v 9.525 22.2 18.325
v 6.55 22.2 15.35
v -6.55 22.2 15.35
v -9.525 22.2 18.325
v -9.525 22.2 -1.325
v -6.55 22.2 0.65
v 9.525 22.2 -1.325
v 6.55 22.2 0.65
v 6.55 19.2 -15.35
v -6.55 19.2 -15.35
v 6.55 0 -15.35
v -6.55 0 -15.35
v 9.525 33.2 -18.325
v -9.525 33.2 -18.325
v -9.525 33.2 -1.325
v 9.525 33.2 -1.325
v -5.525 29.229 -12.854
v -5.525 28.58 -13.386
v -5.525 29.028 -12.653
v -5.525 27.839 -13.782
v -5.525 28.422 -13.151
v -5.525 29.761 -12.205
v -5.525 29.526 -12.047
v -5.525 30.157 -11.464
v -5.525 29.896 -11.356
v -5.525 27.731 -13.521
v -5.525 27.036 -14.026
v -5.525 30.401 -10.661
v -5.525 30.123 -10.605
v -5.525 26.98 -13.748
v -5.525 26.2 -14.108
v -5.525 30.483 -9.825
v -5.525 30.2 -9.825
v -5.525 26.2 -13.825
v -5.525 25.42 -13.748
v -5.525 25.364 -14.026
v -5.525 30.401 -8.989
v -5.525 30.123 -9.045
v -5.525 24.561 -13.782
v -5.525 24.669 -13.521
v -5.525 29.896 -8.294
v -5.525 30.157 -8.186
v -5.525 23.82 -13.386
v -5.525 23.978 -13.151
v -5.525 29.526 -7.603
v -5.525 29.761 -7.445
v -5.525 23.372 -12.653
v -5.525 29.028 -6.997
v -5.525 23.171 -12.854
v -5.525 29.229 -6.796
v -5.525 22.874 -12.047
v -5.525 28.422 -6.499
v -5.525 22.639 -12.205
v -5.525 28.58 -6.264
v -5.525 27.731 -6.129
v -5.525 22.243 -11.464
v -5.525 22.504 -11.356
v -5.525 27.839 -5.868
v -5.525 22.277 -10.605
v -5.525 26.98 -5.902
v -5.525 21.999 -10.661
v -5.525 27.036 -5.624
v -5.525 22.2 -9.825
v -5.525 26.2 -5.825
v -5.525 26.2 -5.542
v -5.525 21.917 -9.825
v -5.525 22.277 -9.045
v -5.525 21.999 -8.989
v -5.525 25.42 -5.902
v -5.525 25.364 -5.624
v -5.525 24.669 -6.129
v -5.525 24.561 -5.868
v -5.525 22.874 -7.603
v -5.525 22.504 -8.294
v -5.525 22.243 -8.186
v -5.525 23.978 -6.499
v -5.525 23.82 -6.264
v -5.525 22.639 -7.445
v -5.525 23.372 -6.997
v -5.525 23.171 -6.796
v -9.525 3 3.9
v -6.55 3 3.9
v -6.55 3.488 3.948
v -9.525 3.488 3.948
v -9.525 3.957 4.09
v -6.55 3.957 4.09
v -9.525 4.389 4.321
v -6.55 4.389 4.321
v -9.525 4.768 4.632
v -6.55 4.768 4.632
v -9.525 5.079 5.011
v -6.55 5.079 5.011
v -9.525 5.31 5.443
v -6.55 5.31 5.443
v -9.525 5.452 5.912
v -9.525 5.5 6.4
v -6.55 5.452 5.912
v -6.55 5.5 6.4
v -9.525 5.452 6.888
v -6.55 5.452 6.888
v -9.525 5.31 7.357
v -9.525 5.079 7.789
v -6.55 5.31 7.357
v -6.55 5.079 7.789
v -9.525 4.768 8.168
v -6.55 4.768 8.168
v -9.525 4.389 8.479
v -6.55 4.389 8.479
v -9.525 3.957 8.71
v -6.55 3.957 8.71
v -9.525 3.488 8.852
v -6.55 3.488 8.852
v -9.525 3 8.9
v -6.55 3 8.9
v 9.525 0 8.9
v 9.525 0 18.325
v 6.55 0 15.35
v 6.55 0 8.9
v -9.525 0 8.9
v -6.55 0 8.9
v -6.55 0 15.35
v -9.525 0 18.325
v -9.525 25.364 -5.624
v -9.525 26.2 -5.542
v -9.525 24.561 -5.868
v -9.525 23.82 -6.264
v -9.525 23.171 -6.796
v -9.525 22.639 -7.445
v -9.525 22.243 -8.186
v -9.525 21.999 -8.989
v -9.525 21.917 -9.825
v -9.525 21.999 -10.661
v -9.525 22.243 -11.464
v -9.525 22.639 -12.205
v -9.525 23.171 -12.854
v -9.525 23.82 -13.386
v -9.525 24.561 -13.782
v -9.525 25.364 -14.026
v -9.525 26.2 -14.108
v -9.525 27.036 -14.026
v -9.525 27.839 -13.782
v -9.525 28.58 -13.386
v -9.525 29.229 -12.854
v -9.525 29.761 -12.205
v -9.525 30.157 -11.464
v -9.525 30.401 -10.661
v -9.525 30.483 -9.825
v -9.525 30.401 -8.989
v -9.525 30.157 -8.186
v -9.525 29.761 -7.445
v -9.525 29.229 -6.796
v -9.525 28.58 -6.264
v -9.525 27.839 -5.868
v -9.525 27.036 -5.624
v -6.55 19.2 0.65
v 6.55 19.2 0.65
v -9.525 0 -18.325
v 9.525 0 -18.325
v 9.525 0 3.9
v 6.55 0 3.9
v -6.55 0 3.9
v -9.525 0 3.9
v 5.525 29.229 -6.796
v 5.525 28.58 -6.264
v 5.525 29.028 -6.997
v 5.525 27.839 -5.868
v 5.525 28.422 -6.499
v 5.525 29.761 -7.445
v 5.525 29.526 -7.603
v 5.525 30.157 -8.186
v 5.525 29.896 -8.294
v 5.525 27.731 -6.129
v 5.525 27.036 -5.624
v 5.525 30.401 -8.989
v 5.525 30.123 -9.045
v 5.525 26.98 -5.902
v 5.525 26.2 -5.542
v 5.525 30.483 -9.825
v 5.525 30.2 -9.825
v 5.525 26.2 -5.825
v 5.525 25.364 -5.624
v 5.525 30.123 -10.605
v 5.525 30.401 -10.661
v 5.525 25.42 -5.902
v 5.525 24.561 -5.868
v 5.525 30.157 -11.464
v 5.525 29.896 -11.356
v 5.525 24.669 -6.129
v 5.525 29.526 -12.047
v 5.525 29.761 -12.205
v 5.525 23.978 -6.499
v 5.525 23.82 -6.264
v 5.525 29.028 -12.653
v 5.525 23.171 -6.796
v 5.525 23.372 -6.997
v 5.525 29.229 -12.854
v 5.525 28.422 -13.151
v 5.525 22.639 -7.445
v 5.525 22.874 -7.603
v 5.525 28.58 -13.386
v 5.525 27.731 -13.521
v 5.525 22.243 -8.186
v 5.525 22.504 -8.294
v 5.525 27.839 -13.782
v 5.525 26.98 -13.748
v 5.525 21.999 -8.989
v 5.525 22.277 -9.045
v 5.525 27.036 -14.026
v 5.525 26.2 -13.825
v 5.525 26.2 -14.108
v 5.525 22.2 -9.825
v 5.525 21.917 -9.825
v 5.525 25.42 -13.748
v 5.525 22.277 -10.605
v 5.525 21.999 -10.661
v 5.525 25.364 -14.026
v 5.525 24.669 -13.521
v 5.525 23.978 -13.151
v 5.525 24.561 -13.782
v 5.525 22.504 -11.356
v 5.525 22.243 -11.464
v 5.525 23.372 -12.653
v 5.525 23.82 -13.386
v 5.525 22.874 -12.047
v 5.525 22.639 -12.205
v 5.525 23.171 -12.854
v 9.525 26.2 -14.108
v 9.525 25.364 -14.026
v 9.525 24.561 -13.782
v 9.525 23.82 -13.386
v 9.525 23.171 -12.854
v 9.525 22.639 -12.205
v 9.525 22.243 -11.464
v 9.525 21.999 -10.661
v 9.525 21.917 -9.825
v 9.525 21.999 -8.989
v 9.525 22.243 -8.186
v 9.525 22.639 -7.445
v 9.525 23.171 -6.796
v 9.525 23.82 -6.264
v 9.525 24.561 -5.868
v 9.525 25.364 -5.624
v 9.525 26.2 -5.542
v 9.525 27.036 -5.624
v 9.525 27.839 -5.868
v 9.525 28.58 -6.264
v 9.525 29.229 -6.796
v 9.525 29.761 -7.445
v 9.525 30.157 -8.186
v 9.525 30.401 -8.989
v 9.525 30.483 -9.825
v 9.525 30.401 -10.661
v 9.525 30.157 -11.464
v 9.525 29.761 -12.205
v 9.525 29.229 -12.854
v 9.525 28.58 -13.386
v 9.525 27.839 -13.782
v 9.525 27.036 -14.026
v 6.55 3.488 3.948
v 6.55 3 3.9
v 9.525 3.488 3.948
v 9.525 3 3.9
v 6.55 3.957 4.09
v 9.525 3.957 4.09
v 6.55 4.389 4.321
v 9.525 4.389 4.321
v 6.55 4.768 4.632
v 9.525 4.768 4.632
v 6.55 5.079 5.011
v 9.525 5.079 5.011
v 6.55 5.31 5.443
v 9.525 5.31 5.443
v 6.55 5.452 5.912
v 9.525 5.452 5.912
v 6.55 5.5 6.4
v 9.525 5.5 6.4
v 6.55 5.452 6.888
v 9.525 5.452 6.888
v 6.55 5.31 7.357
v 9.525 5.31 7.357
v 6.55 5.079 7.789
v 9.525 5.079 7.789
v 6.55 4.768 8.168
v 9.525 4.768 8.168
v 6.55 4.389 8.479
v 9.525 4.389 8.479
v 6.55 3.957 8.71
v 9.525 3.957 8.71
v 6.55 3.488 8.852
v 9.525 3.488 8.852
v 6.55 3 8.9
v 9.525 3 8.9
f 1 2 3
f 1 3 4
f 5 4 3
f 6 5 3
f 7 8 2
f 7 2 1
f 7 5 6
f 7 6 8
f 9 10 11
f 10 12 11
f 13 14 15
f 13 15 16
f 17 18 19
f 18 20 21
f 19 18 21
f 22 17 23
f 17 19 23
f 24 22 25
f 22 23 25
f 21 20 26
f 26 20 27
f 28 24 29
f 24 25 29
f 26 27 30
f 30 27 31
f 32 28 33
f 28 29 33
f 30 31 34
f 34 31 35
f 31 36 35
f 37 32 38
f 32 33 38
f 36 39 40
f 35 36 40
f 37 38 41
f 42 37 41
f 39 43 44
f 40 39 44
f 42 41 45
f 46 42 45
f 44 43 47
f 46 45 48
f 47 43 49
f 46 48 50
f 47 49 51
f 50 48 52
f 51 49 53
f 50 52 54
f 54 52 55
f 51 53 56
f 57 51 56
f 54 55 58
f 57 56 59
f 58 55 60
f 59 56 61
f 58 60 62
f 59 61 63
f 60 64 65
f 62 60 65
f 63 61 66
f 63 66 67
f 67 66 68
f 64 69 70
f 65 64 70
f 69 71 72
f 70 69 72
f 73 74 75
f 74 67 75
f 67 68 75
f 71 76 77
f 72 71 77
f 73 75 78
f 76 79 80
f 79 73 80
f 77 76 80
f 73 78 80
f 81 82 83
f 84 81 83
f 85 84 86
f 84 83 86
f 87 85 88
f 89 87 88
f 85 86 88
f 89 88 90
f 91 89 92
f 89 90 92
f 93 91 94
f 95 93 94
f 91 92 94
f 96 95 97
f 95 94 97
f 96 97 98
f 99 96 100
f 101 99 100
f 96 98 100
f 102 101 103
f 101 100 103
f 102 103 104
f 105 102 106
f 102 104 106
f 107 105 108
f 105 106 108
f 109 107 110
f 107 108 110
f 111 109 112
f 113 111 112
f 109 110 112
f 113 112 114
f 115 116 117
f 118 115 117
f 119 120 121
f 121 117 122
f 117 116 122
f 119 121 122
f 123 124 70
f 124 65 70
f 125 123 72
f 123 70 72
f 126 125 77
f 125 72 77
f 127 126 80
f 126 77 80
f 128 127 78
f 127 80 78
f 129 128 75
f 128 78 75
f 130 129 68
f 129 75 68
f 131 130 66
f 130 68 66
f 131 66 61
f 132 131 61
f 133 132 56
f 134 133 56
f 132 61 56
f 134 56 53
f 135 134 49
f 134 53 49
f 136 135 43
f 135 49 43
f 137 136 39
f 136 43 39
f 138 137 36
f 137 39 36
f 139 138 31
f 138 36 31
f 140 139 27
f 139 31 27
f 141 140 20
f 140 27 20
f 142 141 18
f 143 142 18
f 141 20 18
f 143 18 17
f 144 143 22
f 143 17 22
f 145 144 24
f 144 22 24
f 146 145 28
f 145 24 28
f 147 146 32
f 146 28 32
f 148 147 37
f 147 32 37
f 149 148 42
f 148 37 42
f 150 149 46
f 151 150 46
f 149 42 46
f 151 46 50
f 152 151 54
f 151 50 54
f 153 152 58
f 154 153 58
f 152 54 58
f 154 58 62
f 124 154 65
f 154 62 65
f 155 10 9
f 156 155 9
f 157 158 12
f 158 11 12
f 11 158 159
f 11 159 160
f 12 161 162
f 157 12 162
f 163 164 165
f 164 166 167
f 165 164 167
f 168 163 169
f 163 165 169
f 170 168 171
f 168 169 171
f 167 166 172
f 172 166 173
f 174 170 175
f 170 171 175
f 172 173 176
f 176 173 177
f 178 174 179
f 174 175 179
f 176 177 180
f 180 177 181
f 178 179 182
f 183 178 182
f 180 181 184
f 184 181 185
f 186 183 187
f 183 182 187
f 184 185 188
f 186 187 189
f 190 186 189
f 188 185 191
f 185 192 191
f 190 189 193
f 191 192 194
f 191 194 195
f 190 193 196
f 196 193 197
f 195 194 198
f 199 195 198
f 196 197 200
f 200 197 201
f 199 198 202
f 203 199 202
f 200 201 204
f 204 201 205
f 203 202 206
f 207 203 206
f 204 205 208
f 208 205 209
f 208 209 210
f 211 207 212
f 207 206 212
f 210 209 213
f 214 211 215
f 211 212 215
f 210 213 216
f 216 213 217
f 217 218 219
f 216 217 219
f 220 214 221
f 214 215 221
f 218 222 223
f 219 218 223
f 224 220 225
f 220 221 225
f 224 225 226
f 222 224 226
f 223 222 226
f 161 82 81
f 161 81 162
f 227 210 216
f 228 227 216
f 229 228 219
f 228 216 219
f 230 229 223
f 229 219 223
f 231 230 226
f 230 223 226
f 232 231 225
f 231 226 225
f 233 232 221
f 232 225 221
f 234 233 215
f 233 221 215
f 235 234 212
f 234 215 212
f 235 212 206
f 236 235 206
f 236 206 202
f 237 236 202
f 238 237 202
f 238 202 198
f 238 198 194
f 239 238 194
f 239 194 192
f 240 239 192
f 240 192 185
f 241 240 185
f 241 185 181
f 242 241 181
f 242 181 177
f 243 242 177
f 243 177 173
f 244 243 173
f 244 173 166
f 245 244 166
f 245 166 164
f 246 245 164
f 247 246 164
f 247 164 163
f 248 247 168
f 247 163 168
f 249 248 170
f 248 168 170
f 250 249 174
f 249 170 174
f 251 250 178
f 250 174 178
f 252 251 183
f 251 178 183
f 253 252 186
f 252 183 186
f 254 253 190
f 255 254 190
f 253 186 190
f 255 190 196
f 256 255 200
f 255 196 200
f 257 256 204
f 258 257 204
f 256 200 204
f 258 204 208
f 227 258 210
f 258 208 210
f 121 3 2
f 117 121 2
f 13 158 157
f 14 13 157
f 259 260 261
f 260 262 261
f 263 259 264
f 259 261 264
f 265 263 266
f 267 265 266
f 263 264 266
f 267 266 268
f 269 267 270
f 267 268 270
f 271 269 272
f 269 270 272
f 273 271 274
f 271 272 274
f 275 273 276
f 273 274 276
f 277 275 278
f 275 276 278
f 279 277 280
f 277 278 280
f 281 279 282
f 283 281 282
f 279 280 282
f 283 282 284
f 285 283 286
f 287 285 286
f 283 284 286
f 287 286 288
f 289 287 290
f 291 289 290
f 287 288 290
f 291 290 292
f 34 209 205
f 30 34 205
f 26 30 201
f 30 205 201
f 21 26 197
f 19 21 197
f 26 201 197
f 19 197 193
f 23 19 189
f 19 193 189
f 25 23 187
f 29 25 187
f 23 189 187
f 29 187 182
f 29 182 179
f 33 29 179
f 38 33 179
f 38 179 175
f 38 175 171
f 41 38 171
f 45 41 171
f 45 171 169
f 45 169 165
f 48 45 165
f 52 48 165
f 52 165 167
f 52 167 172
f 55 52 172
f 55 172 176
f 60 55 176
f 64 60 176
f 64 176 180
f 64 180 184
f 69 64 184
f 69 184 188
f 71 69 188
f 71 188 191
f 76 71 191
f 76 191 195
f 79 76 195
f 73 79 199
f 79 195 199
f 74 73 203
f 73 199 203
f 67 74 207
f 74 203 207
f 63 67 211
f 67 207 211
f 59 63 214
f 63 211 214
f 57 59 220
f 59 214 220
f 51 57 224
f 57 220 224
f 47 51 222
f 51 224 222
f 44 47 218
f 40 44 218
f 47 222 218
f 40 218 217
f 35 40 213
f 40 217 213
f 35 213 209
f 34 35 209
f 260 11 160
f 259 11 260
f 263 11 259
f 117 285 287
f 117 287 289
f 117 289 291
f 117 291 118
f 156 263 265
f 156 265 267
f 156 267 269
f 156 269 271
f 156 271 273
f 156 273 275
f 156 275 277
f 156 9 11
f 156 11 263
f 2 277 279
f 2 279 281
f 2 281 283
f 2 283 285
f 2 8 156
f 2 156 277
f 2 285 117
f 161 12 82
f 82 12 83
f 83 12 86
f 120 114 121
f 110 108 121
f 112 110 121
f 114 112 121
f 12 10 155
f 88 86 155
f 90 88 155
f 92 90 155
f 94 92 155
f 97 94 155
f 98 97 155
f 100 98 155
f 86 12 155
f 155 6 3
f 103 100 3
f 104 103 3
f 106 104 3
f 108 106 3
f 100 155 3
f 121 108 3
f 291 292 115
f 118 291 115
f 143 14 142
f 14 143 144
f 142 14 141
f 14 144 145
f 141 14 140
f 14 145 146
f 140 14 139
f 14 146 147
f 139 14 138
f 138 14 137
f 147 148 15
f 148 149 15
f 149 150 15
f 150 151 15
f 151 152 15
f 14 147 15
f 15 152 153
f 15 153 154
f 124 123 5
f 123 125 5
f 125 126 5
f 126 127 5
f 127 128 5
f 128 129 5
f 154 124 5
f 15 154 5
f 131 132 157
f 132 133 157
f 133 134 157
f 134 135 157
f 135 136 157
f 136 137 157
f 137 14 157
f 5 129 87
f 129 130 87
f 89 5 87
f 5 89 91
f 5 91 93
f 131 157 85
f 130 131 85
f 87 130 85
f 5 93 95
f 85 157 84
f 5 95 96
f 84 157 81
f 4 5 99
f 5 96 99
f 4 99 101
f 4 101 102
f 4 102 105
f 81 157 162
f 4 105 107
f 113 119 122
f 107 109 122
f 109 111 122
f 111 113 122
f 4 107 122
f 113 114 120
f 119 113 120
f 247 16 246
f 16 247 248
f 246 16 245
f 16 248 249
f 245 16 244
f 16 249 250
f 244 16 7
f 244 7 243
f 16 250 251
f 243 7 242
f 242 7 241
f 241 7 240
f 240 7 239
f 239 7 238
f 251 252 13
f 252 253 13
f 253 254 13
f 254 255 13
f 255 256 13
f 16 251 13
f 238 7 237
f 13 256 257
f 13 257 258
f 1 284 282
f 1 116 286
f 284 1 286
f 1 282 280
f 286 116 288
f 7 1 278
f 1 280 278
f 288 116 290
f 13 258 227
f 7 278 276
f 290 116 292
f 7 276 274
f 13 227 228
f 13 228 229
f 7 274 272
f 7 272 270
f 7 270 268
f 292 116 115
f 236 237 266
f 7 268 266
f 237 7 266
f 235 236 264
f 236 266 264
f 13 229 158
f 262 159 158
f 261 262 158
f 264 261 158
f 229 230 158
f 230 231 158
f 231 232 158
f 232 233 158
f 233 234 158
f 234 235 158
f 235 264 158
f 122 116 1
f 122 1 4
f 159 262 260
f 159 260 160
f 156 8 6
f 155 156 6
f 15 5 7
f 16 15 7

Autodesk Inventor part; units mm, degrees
ref_plane "YZ Plane" through (0, 0, 0) normal (1, 0, 0) x (0, 1, 0)
ref_plane "XZ Plane" through (0, 0, 0) normal (0, 1, 0) x (-1, 0, 0)
ref_plane "XY Plane" through (0, 0, 0) normal (0, 0, 1) x (1, 0, 0)
sketch "Sketch1" plane through (0, 0, 0) normal (0, 1, 0) x (-1, 0, 0)
  point P0 (0, 0)
sketch "Sketch2" plane through (0, 0, 0) normal (0, 1, 0) x (-1, 0, 0)
  line L0 (-6.55, 15.35) -> (6.55, 15.35)
  line L1 (6.55, 15.35) -> (6.55, -15.35)
  line L2 (6.55, -15.35) -> (-6.55, -15.35)
  line L3 (-6.55, -15.35) -> (-6.55, 15.35)
  line L4 (-6.55, 15.35) -> (6.55, -15.35) construction
  line L5 (6.55, 15.35) -> (-6.55, -15.35) construction
  line L6 (-9.525, 18.325) -> (9.525, 18.325)
  line L7 (9.525, 18.325) -> (9.525, -18.325)
  line L8 (9.525, -18.325) -> (-9.525, -18.325)
  line L9 (-9.525, -18.325) -> (-9.525, 18.325)
  line L10 (-9.525, 18.325) -> (9.525, -18.325) construction
  line L11 (9.525, 18.325) -> (-9.525, -18.325) construction
  point P0 (0, 0)
  dimension "d0" = 13.1
  dimension "d1" = 30.7
  dimension "d2" = 19.05
  dimension "d3" = 36.65
extrude "Extrusion1" add sketch "Sketch2" along normal blind 19.2
sketch "Sketch3" plane through (0, 19.2, 0) normal (0, 1, 0) x (1, 0, 0)
  line L0 (-9.525, -18.325) -> (9.525, -18.325)
  line L1 (9.525, -18.325) -> (9.525, 18.325)
  line L2 (9.525, 18.325) -> (-9.525, 18.325)
  line L3 (-9.525, 18.325) -> (-9.525, -18.325)
  point P0 (0, 0)
extrude "Extrusion2" add sketch "Sketch3" along normal blind 3
sketch "Sketch4" plane through (0, 22.2, 0) normal (0, 1, 0) x (1, 0, 0)
  line L0 (-6.55, -15.35) -> (-6.55, 15.35) construction
  line L1 (6.55, -15.35) -> (-6.55, -15.35) construction
  line L2 (-6.55, -15.35) -> (-6.55, 15.35) construction
  line L3 (-6.55, 15.35) -> (6.55, 15.35) construction
  line L4 (6.55, 15.35) -> (6.55, -15.35) construction
  line L5 (6.55, -15.35) -> (-6.55, 15.35) construction
  line L6 (-6.55, -15.35) -> (6.55, 15.35) construction
  line L7 (6.55, 15.35) -> (6.55, -15.35) projected
  line L8 (-6.55, -15.35) -> (6.55, -15.35)
  line L9 (6.55, -15.35) -> (6.55, -0.65)
  line L10 (6.55, -0.65) -> (-6.55, -0.65)
  line L11 (-6.55, -0.65) -> (-6.55, -15.35)
  point P0 (0, 0)
  point P1 (6.55, -15.35)
  dimension "d8" = 14.7
extrude "Extrusion3" cut sketch "Sketch4" against normal blind 5
sketch "Sketch6" plane through (9.525, 0, 18.325) normal (1, 0, 0) x (0, 0, -1)
  line L0 (0, 0) -> (36.65, 0) construction
  line L1 (0, 0) -> (11.925, 0) construction
  line L2 (11.925, 0) -> (11.925, 3) construction
  line L3 (11.925, 3) -> (0, 3) construction
  line L4 (0, 3) -> (0, 0) construction
  circle A0 centre (11.925, 3) radius 2.5
  line L5 (9.425, 3) -> (9.425, -0.2828)
  line L6 (14.425, 3) -> (14.425, 0)
  line L7 (9.425, 0) -> (14.425, 0)
  point P0 (18.325, 0)
  dimension "d16" = 11.925
  dimension "d17" = 3
  dimension "d18" = 5
extrude "Extrusion5" cut sketch "Sketch6" against normal through all
sketch "Sketch7" plane through (0, 22.2, 0) normal (0, 1, 0) x (1, 0, 0)
  line L0 (9.525, 18.325) -> (-9.525, 18.325) projected
  line L1 (-9.525, 18.325) -> (-9.525, -18.325) projected
  line L2 (9.525, 18.325) -> (-9.525, 18.325)
  line L3 (-9.525, 18.325) -> (-9.525, 1.325)
  line L4 (-9.525, 1.325) -> (9.525, 1.325)
  line L5 (9.525, 1.325) -> (9.525, 18.325)
  point P0 (0, 0)
  dimension "d21" = 17
extrude "Extrusion6" add sketch "Sketch7" along normal blind 11
sketch "Sketch8" plane through (9.525, 0, 18.325) normal (1, 0, 0) x (0, 0, -1)
  line L0 (19.65, 33.2) -> (36.65, 33.2) construction
  line L1 (28.15, 33.2) -> (28.15, 26.2) construction
  circle A0 centre (28.15, 26.2) radius 4
  point P0 (18.325, 0)
  dimension "d24" = 7
  dimension "d25" = 8
extrude "Extrusion7" cut sketch "Sketch8" against normal through all
sketch "Sketch9" plane through (9.525, 0, 18.325) normal (1, 0, 0) x (0, 0, -1)
  circle A0 centre (28.15, 26.2) radius 4 construction
  circle A1 centre (28.15, 26.2) radius 4 construction
  point P0 (18.325, 0)
hole "Hole1" at (9.525, 26.2, -9.825) direction (-1, 0, 0) diameter 8.566 depth 4 thread size "G9.728x0.907" designation "G 1/8" standard "ISO Pipe Threads"
sketch "Sketch10" plane through (-9.525, 0, 18.325) normal (-1, 0, 0) x (0, 0, 1)
  circle A0 centre (-28.15, 26.2) radius 4 construction
  circle A1 centre (-28.15, 26.2) radius 4 construction
  point P0 (-18.325, 0)
hole "Hole2" at (-9.525, 26.2, -9.825) direction (1, 0, 0) diameter 8.566 depth 4 thread size "G9.728x0.907" designation "G 1/8" standard "ISO Pipe Threads"
properties part number "ADAPTER_AOM-brimrose-watercooled-cover-2"
